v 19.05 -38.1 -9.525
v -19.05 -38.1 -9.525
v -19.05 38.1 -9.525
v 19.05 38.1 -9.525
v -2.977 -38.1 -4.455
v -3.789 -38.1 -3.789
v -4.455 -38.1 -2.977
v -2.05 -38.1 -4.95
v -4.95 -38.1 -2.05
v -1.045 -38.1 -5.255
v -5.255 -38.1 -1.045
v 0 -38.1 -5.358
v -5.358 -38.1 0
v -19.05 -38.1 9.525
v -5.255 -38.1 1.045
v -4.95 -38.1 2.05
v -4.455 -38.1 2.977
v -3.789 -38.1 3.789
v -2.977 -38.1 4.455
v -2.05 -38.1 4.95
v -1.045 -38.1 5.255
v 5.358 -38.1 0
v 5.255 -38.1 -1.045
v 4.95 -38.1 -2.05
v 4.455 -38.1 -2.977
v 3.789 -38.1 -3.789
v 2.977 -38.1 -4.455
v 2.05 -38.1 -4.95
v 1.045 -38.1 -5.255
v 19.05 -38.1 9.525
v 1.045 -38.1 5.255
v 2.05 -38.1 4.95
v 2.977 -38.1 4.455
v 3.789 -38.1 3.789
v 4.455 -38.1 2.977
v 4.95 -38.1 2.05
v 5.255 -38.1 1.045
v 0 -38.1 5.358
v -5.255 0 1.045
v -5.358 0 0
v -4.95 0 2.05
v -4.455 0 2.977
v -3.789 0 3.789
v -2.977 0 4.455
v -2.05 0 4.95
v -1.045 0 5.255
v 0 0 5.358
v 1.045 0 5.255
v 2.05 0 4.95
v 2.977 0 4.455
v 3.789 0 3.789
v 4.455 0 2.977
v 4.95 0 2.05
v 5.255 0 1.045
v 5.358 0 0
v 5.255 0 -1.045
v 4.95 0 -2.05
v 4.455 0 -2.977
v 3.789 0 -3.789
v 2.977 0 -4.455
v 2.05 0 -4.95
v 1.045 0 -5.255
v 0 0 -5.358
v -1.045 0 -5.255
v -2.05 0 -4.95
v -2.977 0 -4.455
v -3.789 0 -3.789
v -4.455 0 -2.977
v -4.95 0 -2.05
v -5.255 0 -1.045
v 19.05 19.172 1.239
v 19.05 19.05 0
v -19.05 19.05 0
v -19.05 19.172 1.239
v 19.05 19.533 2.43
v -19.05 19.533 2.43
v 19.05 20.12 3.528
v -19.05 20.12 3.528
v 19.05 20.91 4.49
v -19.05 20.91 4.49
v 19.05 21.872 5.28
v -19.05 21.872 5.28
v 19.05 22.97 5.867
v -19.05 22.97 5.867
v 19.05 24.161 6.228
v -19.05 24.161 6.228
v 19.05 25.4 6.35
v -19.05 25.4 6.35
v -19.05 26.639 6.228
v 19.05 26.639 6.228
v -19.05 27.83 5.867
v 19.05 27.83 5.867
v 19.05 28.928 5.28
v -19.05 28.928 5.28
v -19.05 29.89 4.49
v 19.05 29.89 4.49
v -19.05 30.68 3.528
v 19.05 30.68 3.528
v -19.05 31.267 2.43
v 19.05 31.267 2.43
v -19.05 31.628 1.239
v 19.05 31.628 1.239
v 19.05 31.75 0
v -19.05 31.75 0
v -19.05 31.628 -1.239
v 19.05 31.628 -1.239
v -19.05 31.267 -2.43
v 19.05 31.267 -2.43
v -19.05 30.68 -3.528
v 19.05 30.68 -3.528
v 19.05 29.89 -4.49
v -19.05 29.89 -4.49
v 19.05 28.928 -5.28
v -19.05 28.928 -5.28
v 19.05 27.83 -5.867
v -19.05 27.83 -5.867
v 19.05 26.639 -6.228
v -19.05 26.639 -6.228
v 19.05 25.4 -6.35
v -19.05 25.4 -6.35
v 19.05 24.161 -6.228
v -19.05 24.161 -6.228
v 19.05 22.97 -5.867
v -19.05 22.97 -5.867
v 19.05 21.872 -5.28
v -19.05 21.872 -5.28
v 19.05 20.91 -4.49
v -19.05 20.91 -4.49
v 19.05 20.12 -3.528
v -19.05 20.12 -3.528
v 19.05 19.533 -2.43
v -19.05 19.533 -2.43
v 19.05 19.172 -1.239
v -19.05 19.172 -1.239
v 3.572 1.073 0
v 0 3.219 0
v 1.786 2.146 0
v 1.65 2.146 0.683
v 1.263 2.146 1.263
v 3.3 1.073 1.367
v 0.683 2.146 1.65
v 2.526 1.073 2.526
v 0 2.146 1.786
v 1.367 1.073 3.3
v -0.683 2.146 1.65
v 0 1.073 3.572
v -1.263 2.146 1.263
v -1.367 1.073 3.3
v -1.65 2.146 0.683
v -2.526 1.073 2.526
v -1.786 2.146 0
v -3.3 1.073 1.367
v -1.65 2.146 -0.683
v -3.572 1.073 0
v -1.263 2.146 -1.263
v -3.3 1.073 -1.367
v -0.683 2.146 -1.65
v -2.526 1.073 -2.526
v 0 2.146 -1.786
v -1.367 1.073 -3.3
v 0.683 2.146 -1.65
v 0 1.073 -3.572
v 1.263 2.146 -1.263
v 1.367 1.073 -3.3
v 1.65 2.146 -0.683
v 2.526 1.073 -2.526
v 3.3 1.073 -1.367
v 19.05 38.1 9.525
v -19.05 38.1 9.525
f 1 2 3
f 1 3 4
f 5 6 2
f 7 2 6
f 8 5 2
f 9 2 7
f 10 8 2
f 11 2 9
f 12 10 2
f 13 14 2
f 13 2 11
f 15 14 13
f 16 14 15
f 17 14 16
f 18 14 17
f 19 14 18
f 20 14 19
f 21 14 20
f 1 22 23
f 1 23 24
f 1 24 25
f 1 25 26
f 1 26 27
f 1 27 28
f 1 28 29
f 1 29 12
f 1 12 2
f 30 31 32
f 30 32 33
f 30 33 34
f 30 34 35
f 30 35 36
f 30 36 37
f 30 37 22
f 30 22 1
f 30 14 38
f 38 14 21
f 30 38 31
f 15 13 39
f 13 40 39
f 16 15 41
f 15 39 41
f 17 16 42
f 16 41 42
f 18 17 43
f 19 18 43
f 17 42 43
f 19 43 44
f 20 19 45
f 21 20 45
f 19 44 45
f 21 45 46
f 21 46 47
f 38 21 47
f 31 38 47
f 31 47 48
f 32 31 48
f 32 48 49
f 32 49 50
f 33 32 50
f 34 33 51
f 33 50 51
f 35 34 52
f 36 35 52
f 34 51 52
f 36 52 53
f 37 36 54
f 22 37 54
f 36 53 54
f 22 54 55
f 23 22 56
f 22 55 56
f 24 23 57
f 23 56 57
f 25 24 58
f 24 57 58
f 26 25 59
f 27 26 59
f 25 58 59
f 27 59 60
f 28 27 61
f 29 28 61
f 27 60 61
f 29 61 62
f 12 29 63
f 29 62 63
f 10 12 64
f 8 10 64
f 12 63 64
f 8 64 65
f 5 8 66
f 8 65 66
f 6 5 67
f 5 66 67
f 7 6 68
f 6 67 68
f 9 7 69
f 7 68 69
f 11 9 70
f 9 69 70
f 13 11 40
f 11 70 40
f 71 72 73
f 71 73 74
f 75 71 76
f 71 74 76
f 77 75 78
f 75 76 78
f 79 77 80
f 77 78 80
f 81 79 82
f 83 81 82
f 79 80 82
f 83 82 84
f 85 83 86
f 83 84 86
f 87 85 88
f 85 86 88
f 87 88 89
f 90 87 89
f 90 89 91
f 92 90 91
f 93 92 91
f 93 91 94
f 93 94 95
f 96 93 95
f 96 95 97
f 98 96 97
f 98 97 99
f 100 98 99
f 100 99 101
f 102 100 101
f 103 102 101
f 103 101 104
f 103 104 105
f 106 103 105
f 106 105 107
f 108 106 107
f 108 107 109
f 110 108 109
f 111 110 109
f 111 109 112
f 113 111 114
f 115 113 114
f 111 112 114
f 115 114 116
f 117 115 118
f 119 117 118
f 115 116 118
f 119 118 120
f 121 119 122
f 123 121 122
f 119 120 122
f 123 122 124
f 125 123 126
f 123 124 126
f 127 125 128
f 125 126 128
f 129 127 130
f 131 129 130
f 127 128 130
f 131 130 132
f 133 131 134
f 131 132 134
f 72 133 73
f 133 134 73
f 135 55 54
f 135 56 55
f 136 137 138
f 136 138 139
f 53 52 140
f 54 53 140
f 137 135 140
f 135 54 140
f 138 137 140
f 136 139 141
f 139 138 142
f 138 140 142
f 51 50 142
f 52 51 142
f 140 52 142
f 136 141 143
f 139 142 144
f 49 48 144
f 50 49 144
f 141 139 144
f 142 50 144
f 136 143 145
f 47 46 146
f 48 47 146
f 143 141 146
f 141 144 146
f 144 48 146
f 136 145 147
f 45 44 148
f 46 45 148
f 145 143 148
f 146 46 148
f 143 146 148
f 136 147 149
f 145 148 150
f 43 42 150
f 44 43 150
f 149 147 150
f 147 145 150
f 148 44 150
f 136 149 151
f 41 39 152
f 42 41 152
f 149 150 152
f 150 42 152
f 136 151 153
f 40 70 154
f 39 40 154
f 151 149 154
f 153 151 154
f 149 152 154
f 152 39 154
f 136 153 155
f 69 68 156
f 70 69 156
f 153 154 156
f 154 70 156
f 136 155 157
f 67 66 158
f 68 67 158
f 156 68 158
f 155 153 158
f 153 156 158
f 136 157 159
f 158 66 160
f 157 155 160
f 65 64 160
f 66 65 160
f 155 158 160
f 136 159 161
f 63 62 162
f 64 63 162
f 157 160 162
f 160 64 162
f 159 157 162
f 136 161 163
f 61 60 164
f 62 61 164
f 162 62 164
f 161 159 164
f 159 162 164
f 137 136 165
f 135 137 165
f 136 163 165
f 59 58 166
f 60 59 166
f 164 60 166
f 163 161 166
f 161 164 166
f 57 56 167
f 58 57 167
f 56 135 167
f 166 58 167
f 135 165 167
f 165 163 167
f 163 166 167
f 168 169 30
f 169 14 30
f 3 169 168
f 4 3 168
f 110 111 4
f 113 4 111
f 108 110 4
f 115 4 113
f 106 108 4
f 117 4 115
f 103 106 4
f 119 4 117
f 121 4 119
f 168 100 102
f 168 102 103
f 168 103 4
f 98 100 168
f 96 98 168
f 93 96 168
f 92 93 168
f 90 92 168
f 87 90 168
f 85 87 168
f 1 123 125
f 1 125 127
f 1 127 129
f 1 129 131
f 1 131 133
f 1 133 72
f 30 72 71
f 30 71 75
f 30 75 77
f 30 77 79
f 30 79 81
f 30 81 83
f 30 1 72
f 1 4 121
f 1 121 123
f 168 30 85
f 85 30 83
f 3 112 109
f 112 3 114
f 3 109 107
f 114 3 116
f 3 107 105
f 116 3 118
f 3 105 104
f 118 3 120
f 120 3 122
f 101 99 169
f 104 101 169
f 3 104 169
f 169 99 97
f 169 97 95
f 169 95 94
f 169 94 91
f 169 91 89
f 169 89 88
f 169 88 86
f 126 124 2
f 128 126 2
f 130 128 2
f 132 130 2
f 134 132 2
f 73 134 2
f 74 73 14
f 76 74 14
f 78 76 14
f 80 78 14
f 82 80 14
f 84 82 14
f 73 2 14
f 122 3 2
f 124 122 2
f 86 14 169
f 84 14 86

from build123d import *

# Parameters (mm, degrees)
F0_W     = 38.1
F0_H     = 19.05
F1_DEPTH = 38.1
F4_D     = 10.71626
F4_DEPTH = 38.1
F4_TIP   = 3.2194893086
F5_D     = 12.7


# Not quite as in the source:
# - a length typed as a fraction of an inch, garbled in the dataset ("3 / 203.2 mm" for 3/8 in), is restored


with BuildPart() as f1:
    # F0 (on Front) → F1 (new body, symmetric)
    with BuildSketch(Plane.XZ):
        Rectangle(F0_W, F0_H)
    extrude(amount=F1_DEPTH, both=True)

    # F4
    with Locations(Plane.XZ.offset(38.1)):
        with Locations((0, 0)):
            Hole(F4_D / 2, depth=F4_DEPTH)
            with Locations((0, 0, -(F4_DEPTH + F4_TIP / 2))):  # 118° drill point
                Cone(0, F4_D / 2, F4_TIP, mode=Mode.SUBTRACT)

    # F5 (through all)
    with Locations(Plane.YZ.offset(19.05)):
        with Locations((25.4, 0)):
            Hole(F5_D / 2)


solid = f1.part
